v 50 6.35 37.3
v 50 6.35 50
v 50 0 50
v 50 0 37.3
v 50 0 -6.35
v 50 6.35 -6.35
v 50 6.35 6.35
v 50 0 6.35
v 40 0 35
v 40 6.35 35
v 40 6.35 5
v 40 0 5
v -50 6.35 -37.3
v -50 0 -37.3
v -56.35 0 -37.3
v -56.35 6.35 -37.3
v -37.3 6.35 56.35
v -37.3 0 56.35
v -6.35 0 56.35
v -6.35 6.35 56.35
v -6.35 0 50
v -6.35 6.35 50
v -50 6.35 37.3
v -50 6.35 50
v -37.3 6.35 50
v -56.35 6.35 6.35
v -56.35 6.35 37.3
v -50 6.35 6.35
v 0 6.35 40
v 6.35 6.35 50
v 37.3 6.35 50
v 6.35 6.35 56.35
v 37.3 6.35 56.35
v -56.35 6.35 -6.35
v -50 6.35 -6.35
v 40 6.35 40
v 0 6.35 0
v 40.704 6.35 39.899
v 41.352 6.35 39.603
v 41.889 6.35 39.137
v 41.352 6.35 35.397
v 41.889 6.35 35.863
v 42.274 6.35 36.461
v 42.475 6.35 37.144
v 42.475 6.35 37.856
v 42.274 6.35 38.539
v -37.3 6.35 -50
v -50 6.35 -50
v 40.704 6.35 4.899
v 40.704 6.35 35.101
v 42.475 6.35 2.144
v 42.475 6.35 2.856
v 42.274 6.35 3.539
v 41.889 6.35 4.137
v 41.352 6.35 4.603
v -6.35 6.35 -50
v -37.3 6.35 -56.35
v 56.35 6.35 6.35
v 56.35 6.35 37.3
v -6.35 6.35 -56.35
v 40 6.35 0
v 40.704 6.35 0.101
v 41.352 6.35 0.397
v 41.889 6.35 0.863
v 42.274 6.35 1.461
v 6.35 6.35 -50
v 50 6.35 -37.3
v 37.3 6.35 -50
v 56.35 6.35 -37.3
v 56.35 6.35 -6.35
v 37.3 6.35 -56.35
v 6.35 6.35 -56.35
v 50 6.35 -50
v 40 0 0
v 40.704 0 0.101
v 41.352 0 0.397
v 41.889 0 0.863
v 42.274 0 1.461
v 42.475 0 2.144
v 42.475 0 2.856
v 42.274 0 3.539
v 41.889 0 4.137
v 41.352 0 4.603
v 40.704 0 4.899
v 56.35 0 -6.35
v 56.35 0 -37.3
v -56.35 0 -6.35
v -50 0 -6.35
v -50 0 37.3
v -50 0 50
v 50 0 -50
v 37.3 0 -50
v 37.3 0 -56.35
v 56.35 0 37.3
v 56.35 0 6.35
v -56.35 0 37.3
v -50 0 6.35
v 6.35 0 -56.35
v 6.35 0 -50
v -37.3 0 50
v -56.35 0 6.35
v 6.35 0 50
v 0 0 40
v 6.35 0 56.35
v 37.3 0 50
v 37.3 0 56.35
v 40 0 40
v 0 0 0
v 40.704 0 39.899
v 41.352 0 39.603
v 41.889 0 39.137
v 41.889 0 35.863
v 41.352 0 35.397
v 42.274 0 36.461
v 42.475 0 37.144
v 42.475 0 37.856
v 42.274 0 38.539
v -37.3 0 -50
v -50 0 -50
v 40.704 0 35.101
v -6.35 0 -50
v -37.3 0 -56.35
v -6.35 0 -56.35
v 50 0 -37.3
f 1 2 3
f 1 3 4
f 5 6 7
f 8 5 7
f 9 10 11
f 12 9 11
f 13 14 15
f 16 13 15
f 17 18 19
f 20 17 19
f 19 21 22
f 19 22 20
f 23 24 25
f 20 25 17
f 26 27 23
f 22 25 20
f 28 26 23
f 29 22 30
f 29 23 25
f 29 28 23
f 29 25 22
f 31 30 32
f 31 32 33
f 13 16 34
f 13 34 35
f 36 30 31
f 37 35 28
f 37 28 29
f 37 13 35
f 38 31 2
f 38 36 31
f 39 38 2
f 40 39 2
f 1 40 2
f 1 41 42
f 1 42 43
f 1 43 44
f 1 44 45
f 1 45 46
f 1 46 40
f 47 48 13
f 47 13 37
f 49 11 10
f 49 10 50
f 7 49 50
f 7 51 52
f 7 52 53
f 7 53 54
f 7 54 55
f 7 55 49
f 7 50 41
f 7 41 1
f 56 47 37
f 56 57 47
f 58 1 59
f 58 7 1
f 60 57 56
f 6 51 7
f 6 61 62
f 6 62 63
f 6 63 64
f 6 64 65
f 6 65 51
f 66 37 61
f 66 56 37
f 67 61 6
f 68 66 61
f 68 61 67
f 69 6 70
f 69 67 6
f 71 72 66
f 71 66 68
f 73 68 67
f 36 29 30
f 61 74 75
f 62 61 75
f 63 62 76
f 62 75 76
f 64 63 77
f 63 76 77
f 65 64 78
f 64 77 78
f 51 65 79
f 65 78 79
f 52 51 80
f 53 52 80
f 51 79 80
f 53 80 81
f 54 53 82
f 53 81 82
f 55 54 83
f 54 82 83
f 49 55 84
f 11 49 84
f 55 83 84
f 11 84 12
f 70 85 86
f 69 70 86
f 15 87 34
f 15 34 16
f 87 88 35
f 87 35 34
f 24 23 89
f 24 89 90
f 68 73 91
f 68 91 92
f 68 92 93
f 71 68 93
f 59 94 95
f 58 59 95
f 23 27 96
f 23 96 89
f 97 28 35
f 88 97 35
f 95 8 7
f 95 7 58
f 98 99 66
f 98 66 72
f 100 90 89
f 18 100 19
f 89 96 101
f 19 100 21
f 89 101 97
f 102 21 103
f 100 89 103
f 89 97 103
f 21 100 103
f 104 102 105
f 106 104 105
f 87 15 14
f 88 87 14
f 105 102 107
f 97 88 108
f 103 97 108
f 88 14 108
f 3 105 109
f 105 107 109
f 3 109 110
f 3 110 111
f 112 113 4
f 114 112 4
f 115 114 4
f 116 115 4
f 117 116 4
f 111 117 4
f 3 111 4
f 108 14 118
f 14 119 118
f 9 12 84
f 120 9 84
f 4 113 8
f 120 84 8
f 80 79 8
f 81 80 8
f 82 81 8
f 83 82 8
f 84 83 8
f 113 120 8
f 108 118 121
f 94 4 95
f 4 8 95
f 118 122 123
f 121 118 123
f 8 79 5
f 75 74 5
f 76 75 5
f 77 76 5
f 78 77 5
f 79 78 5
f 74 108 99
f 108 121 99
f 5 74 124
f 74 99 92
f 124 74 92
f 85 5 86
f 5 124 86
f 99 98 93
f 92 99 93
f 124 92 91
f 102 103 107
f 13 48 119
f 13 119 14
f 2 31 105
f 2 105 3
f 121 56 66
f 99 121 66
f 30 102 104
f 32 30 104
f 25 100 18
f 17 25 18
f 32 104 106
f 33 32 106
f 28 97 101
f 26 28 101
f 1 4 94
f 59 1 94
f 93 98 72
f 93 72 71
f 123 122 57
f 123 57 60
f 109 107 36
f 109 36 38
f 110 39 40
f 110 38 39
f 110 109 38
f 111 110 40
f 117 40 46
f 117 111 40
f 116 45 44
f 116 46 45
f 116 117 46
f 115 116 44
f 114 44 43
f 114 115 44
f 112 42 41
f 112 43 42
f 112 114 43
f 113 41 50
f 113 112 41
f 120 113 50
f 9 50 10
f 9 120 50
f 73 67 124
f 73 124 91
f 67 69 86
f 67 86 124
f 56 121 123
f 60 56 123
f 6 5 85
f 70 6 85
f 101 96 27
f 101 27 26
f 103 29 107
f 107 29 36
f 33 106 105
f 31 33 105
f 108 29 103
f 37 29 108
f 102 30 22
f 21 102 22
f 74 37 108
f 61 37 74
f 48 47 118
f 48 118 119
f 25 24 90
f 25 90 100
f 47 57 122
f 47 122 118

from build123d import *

# Parameters (mm, degrees)
SKETCH1_W           = 112.7
SKETCH1_H           = 112.7
BOSS_EXTRUDE1_DEPTH = 6.35
SKETCH2_W           = 12.7
SKETCH2_H           = 6.35
CUT_EXTRUDE2_DEPTH  = 7.35
CIRPATTERN1_COUNT   = 4
SKETCH5_W           = 6.35
SKETCH5_H           = 19.05
CUT_EXTRUDE3_DEPTH  = 7.35
SKETCH6_W           = 12.7
SKETCH6_H           = 6.35
CUT_EXTRUDE4_DEPTH  = 7.35
CIRPATTERN2_COUNT   = 4
CIRPATTERN3_COUNT   = 4
SKETCH7_W           = 40
SKETCH7_H           = 40
CUT_EXTRUDE5_DEPTH  = 7.35
CUT_EXTRUDE6_START  = -7.35
CUT_EXTRUDE6_DEPTH  = 8.35


with BuildPart() as part:
    # Sketch1 → Boss-Extrude1 (new body)
    with BuildSketch(Plane(origin=(0, 0, 0), x_dir=(1, 0, 0), z_dir=(0, 1, 0))):
        Rectangle(SKETCH1_W, SKETCH1_H)
    extrude(amount=BOSS_EXTRUDE1_DEPTH)

    # Sketch2 → Cut-Extrude2 (cut, through all)
    with BuildSketch(Plane(origin=(0, 6.35, 0), x_dir=(1, 0, 0), z_dir=(0, 1, 0))):
        with Locations((0, 53.175)):
            Rectangle(SKETCH2_W, SKETCH2_H)
    cut_extrude2 = extrude(amount=-CUT_EXTRUDE2_DEPTH, mode=Mode.SUBTRACT)

    # CirPattern1: Cut-Extrude2 ×4 about axis
    cirpattern1_axis = Axis((0, 0, 0), (0, 1, 0))
    for i in range(1, CIRPATTERN1_COUNT):
        add(cut_extrude2.rotate(cirpattern1_axis, i * 360 / CIRPATTERN1_COUNT), mode=Mode.SUBTRACT)

    # Sketch5 → Cut-Extrude3 (cut, through all)
    with BuildSketch(Plane(origin=(0, 6.35, 0), x_dir=(1, 0, 0), z_dir=(0, 1, 0))):
        with Locations((53.175, -46.825)):
            Rectangle(SKETCH5_W, SKETCH5_H)
    cut_extrude3 = extrude(amount=-CUT_EXTRUDE3_DEPTH, mode=Mode.SUBTRACT)

    # Sketch6 → Cut-Extrude4 (cut, through all)
    with BuildSketch(Plane(origin=(0, 6.35, 0), x_dir=(1, 0, 0), z_dir=(0, 1, 0))):
        with Locations((43.65, -53.175)):
            Rectangle(SKETCH6_W, SKETCH6_H)
    cut_extrude4 = extrude(amount=-CUT_EXTRUDE4_DEPTH, mode=Mode.SUBTRACT)

    # CirPattern2: Cut-Extrude3 ×4 about axis
    cirpattern2_axis = Axis((0, 0, 0), (0, 1, 0))
    for i in range(1, CIRPATTERN2_COUNT):
        add(cut_extrude3.rotate(cirpattern2_axis, i * 360 / CIRPATTERN2_COUNT), mode=Mode.SUBTRACT)

    # CirPattern3: Cut-Extrude4 ×4 about axis
    cirpattern3_axis = Axis((0, 0, 0), (0, 1, 0))
    for i in range(1, CIRPATTERN3_COUNT):
        add(cut_extrude4.rotate(cirpattern3_axis, i * 360 / CIRPATTERN3_COUNT), mode=Mode.SUBTRACT)

    # Sketch7 → Cut-Extrude5 (cut, through all)
    with BuildSketch(Plane(origin=(0, 6.35, 0), x_dir=(1, 0, 0), z_dir=(0, 1, 0))):
        with Locations((20, -20)):
            Rectangle(SKETCH7_W, SKETCH7_H)
    extrude(amount=-CUT_EXTRUDE5_DEPTH, mode=Mode.SUBTRACT)

    # Sketch8 → Cut-Extrude6 (cut)
    with BuildSketch(Plane(origin=(0, 6.35, 0), x_dir=(1, 0, 0), z_dir=(0, 1, 0)).offset(CUT_EXTRUDE6_START)):
        with BuildLine():
            Line((40, -35), (40, -40))
            ThreePointArc((40, -40), (42.5, -37.5), (40, -35))
        make_face()
    cut_extrude6 = extrude(amount=CUT_EXTRUDE6_DEPTH, mode=Mode.SUBTRACT)

    # Mirror1: Cut-Extrude6 across plane
    add(cut_extrude6.mirror(Plane(origin=(0, 3.175, 20), x_dir=(1, 0, 0), z_dir=(0, 0, 1))), mode=Mode.SUBTRACT)


solid = part.part
